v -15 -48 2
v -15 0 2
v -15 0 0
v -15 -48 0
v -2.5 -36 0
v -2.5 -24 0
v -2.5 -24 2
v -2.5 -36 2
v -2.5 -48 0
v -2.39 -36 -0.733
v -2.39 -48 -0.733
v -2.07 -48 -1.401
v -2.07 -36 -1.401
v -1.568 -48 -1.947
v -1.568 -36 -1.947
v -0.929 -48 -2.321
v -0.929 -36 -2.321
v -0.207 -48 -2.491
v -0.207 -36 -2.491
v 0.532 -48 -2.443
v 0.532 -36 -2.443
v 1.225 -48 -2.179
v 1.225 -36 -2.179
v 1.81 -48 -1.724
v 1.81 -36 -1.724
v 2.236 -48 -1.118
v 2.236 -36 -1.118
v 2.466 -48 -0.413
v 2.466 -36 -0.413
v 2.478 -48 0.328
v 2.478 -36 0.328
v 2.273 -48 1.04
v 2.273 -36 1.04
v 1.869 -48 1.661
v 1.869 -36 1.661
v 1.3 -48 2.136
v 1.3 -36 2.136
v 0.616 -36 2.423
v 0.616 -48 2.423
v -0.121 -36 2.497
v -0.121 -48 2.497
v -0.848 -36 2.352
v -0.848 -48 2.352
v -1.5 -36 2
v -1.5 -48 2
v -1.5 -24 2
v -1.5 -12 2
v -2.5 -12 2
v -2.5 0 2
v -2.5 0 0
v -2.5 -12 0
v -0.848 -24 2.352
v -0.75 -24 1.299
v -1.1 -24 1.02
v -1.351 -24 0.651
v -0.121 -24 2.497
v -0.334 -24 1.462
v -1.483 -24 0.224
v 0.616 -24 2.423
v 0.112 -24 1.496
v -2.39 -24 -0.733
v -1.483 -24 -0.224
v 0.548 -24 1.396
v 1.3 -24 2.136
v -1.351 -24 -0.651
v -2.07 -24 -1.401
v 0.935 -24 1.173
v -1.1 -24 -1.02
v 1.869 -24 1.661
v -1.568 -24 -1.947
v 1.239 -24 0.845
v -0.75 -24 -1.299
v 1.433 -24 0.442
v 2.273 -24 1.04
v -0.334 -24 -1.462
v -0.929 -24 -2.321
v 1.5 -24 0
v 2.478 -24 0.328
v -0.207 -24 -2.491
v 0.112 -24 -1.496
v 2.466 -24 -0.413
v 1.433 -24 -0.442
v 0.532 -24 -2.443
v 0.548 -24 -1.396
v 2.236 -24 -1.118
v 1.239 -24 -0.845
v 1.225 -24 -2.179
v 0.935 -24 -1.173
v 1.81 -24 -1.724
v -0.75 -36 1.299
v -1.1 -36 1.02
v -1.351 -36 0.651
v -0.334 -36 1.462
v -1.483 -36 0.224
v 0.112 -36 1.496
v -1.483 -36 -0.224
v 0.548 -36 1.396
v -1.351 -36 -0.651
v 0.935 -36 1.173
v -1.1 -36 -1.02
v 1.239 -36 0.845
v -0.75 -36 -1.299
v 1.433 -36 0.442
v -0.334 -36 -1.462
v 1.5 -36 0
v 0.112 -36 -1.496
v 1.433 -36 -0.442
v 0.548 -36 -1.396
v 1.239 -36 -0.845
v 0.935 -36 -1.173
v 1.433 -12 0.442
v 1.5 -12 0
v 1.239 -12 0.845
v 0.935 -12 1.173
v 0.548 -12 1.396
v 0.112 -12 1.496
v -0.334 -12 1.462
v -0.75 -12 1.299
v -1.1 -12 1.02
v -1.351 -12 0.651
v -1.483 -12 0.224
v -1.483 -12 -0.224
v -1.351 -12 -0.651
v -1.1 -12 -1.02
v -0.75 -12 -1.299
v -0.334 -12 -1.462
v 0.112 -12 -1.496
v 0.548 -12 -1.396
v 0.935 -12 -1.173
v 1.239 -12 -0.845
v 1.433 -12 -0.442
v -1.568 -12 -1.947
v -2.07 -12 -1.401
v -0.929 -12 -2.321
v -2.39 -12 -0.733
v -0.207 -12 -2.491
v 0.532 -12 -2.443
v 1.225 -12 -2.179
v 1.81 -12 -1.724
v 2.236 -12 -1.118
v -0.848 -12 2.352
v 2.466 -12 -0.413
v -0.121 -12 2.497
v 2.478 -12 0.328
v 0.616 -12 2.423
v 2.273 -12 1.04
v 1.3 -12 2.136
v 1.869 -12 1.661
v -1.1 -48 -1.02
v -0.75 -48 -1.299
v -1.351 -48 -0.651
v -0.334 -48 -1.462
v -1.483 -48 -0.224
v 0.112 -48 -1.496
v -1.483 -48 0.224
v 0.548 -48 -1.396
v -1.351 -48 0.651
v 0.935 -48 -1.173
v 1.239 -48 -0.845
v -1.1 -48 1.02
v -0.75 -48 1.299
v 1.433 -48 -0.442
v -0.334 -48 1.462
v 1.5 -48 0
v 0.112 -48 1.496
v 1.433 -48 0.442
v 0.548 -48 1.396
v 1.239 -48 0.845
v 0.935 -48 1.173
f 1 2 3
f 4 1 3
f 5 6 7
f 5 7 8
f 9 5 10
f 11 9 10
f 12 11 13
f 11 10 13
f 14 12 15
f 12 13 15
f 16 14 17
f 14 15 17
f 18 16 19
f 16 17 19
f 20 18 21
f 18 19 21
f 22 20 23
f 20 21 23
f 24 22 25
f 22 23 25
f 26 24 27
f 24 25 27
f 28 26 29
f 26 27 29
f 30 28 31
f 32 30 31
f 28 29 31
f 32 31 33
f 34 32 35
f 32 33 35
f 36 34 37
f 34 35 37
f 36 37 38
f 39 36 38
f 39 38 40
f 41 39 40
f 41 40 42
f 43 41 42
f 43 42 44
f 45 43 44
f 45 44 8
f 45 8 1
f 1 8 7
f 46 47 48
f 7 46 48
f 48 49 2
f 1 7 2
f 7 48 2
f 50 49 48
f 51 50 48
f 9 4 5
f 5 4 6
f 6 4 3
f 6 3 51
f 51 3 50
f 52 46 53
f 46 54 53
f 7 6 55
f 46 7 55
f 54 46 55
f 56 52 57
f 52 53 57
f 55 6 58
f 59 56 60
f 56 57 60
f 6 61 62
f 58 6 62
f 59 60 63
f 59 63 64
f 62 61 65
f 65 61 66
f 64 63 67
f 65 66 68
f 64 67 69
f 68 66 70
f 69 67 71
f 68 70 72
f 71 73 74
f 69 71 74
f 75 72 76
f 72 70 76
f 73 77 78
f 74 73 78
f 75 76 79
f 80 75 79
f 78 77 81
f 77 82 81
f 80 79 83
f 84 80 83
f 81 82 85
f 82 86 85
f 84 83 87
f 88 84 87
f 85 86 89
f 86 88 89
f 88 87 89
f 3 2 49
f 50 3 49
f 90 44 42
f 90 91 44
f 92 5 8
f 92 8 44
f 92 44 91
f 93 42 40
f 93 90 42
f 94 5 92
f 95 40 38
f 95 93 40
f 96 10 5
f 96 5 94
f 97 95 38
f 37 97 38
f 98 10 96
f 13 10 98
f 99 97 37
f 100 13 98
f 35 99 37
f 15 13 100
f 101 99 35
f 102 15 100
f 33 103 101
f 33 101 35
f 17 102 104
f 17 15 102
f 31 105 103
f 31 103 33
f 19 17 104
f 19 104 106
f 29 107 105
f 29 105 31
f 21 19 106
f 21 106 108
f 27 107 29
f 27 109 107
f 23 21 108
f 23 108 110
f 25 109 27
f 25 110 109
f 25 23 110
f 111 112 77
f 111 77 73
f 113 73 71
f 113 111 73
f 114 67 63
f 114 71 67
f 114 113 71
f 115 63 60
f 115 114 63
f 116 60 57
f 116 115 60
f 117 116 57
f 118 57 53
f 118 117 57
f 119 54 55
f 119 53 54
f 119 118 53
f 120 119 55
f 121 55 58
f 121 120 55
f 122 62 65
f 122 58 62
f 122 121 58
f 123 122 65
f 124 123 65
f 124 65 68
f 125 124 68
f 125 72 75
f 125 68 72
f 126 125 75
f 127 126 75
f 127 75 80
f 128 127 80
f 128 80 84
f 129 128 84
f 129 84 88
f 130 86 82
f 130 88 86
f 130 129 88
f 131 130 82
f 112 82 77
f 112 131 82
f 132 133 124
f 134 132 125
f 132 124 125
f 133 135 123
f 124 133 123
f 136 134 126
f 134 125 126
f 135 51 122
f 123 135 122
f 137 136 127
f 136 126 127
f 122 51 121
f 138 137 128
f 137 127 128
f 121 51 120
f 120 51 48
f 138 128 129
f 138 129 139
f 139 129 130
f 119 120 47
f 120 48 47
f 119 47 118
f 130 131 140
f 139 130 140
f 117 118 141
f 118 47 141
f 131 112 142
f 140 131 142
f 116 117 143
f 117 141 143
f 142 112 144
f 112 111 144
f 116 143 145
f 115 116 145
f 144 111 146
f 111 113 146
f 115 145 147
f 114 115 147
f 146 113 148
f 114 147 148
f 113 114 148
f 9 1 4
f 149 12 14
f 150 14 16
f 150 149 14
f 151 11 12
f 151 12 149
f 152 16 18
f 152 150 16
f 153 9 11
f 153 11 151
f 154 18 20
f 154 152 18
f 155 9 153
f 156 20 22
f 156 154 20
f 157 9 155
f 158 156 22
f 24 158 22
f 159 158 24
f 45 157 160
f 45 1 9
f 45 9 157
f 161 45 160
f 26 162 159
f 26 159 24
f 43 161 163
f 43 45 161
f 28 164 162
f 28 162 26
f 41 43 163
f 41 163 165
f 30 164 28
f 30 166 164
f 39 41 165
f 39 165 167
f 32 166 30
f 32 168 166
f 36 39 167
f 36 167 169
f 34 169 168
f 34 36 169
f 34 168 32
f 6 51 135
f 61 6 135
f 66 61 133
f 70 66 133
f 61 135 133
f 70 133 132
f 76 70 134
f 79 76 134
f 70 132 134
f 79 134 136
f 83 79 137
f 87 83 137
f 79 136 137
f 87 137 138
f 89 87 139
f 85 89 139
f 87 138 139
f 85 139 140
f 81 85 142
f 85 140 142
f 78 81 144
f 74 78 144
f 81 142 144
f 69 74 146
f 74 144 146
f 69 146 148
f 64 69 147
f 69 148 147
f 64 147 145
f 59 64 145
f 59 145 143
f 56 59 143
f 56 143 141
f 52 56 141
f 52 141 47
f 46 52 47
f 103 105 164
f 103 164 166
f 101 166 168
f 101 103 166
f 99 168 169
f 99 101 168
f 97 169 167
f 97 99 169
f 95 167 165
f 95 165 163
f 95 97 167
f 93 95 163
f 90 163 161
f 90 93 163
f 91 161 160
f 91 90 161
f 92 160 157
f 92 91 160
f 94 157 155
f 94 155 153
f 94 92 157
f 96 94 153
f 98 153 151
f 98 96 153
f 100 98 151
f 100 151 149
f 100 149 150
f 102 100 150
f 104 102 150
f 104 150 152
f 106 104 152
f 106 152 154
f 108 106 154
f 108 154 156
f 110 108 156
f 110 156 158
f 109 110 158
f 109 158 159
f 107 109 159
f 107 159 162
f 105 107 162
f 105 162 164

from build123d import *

# Parameters (mm, degrees)
F0_R     = 1.5
F1_DEPTH = 48
F2_W     = 5
F2_H     = 12
F3_DEPTH = 5


with BuildPart() as f1:
    # F0 (on Front) → F1 (new body)
    with BuildSketch(Plane.XZ):
        with BuildLine():
            Line((-1.5, 2), (-15, 2))
            Line((-15, 2), (-15, 0))
            Line((-15, 0), (-2.5, 0))
            ThreePointArc((-2.5, 0), (2.2360679775, -1.1180339887), (-1.5, 2))
        make_face()
        Circle(F0_R, mode=Mode.SUBTRACT)
    extrude(amount=F1_DEPTH)

    # F2 (on face) → F3 (cut, symmetric)
    with BuildSketch(Plane(origin=(0, 0, 0), x_dir=(1, 0, 0), z_dir=(0, 0, -1))):
        with Locations((0, 6)):
            Rectangle(F2_W, F2_H)
        with Locations((0, 30)):
            Rectangle(F2_W, F2_H)
    extrude(amount=F3_DEPTH, both=True, mode=Mode.SUBTRACT)


solid = f1.part
